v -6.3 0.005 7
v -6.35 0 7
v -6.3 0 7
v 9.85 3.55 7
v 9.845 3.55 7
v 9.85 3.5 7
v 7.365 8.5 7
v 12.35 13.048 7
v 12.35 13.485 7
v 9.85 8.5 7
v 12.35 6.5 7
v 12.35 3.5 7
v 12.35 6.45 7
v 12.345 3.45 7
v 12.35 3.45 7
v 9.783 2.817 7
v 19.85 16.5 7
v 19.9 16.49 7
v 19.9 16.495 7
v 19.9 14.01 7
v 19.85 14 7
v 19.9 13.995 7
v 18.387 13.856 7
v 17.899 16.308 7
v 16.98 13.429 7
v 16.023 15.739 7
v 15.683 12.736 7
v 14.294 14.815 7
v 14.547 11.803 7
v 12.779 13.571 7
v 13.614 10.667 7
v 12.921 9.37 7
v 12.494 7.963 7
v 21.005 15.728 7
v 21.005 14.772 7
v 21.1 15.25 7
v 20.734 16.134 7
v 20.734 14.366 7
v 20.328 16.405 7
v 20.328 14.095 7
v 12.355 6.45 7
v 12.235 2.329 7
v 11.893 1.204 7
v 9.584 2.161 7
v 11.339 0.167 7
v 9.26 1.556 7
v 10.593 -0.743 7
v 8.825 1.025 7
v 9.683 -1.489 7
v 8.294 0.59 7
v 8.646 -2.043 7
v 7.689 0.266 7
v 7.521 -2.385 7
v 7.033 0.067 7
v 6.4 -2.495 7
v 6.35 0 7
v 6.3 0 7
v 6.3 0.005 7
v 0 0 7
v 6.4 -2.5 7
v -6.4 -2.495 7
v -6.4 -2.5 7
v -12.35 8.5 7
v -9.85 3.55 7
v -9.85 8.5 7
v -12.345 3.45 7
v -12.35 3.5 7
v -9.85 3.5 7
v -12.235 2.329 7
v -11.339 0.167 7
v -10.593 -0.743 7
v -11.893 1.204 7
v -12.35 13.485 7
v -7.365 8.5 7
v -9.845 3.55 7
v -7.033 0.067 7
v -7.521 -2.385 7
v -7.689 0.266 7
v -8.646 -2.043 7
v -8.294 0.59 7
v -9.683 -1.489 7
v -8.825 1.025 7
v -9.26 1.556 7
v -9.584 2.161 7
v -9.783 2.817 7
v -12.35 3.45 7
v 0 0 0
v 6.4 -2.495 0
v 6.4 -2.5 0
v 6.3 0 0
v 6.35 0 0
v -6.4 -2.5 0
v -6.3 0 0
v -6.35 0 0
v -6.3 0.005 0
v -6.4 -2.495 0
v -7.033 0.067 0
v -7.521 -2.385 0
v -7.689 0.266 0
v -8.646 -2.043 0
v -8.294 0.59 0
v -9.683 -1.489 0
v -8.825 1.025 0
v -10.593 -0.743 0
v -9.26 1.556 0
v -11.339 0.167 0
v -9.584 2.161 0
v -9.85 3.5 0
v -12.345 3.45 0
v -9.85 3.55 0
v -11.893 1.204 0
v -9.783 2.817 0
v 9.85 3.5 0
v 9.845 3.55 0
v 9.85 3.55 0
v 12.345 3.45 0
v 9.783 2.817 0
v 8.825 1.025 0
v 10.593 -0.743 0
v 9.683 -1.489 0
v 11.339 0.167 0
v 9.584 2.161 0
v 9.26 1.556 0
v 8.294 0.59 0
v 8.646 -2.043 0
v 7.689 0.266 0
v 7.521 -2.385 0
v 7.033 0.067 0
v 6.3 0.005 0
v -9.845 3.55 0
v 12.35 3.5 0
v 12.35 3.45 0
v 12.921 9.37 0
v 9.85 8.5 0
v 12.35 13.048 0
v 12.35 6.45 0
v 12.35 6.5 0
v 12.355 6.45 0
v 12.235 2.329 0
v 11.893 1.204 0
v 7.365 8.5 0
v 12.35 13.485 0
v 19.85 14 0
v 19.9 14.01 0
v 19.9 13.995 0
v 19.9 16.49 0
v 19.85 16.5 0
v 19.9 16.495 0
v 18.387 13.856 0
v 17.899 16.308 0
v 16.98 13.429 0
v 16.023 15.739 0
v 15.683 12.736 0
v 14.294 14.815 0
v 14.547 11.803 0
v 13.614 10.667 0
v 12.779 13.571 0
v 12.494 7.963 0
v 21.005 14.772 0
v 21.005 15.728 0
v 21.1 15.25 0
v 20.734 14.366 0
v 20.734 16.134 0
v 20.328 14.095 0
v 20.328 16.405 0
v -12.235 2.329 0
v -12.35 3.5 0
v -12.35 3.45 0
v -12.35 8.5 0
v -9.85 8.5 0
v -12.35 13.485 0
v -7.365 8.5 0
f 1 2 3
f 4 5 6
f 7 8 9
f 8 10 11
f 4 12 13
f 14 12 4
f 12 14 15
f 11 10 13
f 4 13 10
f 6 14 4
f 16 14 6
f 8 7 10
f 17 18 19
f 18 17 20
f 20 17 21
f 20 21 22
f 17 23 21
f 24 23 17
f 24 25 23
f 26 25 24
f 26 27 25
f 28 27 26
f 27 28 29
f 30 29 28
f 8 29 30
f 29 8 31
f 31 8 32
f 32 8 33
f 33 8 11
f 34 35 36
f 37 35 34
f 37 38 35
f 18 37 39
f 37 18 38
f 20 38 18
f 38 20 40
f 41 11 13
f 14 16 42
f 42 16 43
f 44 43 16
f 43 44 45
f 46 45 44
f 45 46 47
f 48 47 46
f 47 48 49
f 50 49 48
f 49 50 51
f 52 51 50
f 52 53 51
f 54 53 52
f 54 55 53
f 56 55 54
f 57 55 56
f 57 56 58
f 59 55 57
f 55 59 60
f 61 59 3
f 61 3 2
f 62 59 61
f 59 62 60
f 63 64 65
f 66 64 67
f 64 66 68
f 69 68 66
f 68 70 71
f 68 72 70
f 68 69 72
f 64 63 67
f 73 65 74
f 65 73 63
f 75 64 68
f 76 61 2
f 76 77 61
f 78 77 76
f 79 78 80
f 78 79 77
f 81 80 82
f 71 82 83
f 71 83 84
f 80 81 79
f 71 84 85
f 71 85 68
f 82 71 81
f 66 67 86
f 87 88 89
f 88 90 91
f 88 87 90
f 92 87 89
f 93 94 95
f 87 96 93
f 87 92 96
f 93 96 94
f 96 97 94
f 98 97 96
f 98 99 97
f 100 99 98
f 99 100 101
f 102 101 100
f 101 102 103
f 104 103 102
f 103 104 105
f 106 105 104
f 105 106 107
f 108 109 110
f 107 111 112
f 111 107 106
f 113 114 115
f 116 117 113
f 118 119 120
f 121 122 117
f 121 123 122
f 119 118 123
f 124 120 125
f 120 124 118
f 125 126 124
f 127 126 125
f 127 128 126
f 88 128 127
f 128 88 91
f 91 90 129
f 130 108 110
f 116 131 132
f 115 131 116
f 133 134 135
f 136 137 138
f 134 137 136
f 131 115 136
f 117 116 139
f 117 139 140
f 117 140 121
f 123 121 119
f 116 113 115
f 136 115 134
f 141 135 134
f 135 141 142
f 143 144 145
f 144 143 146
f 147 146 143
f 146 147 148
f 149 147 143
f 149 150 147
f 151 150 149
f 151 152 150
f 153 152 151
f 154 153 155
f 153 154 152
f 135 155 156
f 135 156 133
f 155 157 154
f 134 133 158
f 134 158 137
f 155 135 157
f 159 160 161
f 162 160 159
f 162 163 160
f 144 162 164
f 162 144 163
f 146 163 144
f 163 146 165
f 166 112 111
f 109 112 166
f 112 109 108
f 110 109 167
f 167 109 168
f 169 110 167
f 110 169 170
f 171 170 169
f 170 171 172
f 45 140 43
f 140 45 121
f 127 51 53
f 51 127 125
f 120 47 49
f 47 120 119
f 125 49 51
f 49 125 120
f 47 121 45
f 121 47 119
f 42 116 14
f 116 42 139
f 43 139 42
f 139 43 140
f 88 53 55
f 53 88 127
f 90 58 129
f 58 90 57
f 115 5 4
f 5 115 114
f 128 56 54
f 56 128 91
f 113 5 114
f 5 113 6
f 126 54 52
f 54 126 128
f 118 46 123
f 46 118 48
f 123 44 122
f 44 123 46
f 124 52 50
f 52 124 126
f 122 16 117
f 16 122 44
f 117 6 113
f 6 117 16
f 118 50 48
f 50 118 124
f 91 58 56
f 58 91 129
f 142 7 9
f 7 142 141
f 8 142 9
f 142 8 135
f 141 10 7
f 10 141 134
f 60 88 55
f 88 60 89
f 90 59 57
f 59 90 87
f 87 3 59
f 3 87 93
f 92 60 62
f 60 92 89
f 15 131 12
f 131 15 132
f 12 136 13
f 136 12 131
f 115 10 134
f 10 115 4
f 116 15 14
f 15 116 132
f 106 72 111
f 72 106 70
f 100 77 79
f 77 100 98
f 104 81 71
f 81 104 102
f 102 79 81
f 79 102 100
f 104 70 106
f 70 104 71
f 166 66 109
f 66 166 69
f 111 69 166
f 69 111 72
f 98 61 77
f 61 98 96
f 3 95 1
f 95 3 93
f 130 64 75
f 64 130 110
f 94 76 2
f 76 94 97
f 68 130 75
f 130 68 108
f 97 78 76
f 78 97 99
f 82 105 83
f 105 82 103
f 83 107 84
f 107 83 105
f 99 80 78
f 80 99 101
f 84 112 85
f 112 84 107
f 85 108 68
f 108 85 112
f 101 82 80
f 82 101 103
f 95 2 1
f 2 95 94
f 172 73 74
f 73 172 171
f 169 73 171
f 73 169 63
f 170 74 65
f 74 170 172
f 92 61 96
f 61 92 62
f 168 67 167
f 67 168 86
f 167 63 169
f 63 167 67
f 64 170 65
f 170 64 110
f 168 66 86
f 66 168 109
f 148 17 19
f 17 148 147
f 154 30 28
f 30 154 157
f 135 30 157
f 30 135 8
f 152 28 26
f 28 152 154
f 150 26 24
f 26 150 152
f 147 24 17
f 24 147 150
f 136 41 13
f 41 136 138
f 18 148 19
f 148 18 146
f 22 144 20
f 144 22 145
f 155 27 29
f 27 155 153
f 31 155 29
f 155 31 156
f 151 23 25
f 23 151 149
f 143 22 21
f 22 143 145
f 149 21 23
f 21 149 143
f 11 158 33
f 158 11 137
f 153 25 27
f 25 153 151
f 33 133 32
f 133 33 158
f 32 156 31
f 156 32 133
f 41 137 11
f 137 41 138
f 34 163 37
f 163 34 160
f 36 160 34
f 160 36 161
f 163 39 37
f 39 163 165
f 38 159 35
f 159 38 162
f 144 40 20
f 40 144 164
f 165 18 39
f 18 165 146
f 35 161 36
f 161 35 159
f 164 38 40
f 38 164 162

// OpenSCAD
use <../utilities.scad>

span=19.7; //19
corner_r=6;
clip_to_cross=8.5;
t=2.5;
lip=2.5;
d=0.05;
h=7;
$fn=32;

difference(){
	union(){
		reflect([1,0,0]){
			translate([-d,-t,0]) cube([span/2+t+d-corner_r+d,t,h]); //horizontal part
			translate([span/2,corner_r-t-d,0]) cube([t,clip_to_cross+2*d-corner_r+t,h]); //vertical bit
			translate([span/2-corner_r+t,corner_r-t,0]) difference(){ //round corner
				intersection(){
					cylinder(r=corner_r,h=h);
					mirror([0,1,0]) translate([-d,-d,-d]) cube([999,999,999]);
				}
				cylinder(r=corner_r-t,h=999,center=true);
			}
			//clip
			translate([span/2+t,clip_to_cross,0]) mirror([1,0,0]) intersection(){
				rotate([0,0,45]) cube([(lip+t)*1.41,(lip+t)*1.41,2*h],center=true);
				cube([999,999,999]);
			}
		}
//		translate([span/2+t,clip_to_cross,0]) rotate([0,0,-55]) 
//			mirror([1,0,0]) translate([lip*1.41/2+t*(1.41/2-1),0,0]) cube([t,10,h]);
		assign(roc=10) translate([span/2+roc,clip_to_cross-roc/5,0]) union(){
			difference(){
				intersection(){
					cylinder(r=roc,h=h);
					rotate([0,0,90]) translate([-d,-d,-d]) cube([999,999,999]);
				}
				cylinder(r=roc-t,h=999,center=true);
			}
			translate([0,roc-t/2,0]) cylinder(r=t/2,$fn=16,h);
		}
	}
	//repeat([6,0,0],3,center=true) translate([0,0,h/2]) cube([2,999,3],center=true); //holes for cable ties
	translate([0,5/2,0]) cylinder(r=5/2,h=999,center=true);
}
